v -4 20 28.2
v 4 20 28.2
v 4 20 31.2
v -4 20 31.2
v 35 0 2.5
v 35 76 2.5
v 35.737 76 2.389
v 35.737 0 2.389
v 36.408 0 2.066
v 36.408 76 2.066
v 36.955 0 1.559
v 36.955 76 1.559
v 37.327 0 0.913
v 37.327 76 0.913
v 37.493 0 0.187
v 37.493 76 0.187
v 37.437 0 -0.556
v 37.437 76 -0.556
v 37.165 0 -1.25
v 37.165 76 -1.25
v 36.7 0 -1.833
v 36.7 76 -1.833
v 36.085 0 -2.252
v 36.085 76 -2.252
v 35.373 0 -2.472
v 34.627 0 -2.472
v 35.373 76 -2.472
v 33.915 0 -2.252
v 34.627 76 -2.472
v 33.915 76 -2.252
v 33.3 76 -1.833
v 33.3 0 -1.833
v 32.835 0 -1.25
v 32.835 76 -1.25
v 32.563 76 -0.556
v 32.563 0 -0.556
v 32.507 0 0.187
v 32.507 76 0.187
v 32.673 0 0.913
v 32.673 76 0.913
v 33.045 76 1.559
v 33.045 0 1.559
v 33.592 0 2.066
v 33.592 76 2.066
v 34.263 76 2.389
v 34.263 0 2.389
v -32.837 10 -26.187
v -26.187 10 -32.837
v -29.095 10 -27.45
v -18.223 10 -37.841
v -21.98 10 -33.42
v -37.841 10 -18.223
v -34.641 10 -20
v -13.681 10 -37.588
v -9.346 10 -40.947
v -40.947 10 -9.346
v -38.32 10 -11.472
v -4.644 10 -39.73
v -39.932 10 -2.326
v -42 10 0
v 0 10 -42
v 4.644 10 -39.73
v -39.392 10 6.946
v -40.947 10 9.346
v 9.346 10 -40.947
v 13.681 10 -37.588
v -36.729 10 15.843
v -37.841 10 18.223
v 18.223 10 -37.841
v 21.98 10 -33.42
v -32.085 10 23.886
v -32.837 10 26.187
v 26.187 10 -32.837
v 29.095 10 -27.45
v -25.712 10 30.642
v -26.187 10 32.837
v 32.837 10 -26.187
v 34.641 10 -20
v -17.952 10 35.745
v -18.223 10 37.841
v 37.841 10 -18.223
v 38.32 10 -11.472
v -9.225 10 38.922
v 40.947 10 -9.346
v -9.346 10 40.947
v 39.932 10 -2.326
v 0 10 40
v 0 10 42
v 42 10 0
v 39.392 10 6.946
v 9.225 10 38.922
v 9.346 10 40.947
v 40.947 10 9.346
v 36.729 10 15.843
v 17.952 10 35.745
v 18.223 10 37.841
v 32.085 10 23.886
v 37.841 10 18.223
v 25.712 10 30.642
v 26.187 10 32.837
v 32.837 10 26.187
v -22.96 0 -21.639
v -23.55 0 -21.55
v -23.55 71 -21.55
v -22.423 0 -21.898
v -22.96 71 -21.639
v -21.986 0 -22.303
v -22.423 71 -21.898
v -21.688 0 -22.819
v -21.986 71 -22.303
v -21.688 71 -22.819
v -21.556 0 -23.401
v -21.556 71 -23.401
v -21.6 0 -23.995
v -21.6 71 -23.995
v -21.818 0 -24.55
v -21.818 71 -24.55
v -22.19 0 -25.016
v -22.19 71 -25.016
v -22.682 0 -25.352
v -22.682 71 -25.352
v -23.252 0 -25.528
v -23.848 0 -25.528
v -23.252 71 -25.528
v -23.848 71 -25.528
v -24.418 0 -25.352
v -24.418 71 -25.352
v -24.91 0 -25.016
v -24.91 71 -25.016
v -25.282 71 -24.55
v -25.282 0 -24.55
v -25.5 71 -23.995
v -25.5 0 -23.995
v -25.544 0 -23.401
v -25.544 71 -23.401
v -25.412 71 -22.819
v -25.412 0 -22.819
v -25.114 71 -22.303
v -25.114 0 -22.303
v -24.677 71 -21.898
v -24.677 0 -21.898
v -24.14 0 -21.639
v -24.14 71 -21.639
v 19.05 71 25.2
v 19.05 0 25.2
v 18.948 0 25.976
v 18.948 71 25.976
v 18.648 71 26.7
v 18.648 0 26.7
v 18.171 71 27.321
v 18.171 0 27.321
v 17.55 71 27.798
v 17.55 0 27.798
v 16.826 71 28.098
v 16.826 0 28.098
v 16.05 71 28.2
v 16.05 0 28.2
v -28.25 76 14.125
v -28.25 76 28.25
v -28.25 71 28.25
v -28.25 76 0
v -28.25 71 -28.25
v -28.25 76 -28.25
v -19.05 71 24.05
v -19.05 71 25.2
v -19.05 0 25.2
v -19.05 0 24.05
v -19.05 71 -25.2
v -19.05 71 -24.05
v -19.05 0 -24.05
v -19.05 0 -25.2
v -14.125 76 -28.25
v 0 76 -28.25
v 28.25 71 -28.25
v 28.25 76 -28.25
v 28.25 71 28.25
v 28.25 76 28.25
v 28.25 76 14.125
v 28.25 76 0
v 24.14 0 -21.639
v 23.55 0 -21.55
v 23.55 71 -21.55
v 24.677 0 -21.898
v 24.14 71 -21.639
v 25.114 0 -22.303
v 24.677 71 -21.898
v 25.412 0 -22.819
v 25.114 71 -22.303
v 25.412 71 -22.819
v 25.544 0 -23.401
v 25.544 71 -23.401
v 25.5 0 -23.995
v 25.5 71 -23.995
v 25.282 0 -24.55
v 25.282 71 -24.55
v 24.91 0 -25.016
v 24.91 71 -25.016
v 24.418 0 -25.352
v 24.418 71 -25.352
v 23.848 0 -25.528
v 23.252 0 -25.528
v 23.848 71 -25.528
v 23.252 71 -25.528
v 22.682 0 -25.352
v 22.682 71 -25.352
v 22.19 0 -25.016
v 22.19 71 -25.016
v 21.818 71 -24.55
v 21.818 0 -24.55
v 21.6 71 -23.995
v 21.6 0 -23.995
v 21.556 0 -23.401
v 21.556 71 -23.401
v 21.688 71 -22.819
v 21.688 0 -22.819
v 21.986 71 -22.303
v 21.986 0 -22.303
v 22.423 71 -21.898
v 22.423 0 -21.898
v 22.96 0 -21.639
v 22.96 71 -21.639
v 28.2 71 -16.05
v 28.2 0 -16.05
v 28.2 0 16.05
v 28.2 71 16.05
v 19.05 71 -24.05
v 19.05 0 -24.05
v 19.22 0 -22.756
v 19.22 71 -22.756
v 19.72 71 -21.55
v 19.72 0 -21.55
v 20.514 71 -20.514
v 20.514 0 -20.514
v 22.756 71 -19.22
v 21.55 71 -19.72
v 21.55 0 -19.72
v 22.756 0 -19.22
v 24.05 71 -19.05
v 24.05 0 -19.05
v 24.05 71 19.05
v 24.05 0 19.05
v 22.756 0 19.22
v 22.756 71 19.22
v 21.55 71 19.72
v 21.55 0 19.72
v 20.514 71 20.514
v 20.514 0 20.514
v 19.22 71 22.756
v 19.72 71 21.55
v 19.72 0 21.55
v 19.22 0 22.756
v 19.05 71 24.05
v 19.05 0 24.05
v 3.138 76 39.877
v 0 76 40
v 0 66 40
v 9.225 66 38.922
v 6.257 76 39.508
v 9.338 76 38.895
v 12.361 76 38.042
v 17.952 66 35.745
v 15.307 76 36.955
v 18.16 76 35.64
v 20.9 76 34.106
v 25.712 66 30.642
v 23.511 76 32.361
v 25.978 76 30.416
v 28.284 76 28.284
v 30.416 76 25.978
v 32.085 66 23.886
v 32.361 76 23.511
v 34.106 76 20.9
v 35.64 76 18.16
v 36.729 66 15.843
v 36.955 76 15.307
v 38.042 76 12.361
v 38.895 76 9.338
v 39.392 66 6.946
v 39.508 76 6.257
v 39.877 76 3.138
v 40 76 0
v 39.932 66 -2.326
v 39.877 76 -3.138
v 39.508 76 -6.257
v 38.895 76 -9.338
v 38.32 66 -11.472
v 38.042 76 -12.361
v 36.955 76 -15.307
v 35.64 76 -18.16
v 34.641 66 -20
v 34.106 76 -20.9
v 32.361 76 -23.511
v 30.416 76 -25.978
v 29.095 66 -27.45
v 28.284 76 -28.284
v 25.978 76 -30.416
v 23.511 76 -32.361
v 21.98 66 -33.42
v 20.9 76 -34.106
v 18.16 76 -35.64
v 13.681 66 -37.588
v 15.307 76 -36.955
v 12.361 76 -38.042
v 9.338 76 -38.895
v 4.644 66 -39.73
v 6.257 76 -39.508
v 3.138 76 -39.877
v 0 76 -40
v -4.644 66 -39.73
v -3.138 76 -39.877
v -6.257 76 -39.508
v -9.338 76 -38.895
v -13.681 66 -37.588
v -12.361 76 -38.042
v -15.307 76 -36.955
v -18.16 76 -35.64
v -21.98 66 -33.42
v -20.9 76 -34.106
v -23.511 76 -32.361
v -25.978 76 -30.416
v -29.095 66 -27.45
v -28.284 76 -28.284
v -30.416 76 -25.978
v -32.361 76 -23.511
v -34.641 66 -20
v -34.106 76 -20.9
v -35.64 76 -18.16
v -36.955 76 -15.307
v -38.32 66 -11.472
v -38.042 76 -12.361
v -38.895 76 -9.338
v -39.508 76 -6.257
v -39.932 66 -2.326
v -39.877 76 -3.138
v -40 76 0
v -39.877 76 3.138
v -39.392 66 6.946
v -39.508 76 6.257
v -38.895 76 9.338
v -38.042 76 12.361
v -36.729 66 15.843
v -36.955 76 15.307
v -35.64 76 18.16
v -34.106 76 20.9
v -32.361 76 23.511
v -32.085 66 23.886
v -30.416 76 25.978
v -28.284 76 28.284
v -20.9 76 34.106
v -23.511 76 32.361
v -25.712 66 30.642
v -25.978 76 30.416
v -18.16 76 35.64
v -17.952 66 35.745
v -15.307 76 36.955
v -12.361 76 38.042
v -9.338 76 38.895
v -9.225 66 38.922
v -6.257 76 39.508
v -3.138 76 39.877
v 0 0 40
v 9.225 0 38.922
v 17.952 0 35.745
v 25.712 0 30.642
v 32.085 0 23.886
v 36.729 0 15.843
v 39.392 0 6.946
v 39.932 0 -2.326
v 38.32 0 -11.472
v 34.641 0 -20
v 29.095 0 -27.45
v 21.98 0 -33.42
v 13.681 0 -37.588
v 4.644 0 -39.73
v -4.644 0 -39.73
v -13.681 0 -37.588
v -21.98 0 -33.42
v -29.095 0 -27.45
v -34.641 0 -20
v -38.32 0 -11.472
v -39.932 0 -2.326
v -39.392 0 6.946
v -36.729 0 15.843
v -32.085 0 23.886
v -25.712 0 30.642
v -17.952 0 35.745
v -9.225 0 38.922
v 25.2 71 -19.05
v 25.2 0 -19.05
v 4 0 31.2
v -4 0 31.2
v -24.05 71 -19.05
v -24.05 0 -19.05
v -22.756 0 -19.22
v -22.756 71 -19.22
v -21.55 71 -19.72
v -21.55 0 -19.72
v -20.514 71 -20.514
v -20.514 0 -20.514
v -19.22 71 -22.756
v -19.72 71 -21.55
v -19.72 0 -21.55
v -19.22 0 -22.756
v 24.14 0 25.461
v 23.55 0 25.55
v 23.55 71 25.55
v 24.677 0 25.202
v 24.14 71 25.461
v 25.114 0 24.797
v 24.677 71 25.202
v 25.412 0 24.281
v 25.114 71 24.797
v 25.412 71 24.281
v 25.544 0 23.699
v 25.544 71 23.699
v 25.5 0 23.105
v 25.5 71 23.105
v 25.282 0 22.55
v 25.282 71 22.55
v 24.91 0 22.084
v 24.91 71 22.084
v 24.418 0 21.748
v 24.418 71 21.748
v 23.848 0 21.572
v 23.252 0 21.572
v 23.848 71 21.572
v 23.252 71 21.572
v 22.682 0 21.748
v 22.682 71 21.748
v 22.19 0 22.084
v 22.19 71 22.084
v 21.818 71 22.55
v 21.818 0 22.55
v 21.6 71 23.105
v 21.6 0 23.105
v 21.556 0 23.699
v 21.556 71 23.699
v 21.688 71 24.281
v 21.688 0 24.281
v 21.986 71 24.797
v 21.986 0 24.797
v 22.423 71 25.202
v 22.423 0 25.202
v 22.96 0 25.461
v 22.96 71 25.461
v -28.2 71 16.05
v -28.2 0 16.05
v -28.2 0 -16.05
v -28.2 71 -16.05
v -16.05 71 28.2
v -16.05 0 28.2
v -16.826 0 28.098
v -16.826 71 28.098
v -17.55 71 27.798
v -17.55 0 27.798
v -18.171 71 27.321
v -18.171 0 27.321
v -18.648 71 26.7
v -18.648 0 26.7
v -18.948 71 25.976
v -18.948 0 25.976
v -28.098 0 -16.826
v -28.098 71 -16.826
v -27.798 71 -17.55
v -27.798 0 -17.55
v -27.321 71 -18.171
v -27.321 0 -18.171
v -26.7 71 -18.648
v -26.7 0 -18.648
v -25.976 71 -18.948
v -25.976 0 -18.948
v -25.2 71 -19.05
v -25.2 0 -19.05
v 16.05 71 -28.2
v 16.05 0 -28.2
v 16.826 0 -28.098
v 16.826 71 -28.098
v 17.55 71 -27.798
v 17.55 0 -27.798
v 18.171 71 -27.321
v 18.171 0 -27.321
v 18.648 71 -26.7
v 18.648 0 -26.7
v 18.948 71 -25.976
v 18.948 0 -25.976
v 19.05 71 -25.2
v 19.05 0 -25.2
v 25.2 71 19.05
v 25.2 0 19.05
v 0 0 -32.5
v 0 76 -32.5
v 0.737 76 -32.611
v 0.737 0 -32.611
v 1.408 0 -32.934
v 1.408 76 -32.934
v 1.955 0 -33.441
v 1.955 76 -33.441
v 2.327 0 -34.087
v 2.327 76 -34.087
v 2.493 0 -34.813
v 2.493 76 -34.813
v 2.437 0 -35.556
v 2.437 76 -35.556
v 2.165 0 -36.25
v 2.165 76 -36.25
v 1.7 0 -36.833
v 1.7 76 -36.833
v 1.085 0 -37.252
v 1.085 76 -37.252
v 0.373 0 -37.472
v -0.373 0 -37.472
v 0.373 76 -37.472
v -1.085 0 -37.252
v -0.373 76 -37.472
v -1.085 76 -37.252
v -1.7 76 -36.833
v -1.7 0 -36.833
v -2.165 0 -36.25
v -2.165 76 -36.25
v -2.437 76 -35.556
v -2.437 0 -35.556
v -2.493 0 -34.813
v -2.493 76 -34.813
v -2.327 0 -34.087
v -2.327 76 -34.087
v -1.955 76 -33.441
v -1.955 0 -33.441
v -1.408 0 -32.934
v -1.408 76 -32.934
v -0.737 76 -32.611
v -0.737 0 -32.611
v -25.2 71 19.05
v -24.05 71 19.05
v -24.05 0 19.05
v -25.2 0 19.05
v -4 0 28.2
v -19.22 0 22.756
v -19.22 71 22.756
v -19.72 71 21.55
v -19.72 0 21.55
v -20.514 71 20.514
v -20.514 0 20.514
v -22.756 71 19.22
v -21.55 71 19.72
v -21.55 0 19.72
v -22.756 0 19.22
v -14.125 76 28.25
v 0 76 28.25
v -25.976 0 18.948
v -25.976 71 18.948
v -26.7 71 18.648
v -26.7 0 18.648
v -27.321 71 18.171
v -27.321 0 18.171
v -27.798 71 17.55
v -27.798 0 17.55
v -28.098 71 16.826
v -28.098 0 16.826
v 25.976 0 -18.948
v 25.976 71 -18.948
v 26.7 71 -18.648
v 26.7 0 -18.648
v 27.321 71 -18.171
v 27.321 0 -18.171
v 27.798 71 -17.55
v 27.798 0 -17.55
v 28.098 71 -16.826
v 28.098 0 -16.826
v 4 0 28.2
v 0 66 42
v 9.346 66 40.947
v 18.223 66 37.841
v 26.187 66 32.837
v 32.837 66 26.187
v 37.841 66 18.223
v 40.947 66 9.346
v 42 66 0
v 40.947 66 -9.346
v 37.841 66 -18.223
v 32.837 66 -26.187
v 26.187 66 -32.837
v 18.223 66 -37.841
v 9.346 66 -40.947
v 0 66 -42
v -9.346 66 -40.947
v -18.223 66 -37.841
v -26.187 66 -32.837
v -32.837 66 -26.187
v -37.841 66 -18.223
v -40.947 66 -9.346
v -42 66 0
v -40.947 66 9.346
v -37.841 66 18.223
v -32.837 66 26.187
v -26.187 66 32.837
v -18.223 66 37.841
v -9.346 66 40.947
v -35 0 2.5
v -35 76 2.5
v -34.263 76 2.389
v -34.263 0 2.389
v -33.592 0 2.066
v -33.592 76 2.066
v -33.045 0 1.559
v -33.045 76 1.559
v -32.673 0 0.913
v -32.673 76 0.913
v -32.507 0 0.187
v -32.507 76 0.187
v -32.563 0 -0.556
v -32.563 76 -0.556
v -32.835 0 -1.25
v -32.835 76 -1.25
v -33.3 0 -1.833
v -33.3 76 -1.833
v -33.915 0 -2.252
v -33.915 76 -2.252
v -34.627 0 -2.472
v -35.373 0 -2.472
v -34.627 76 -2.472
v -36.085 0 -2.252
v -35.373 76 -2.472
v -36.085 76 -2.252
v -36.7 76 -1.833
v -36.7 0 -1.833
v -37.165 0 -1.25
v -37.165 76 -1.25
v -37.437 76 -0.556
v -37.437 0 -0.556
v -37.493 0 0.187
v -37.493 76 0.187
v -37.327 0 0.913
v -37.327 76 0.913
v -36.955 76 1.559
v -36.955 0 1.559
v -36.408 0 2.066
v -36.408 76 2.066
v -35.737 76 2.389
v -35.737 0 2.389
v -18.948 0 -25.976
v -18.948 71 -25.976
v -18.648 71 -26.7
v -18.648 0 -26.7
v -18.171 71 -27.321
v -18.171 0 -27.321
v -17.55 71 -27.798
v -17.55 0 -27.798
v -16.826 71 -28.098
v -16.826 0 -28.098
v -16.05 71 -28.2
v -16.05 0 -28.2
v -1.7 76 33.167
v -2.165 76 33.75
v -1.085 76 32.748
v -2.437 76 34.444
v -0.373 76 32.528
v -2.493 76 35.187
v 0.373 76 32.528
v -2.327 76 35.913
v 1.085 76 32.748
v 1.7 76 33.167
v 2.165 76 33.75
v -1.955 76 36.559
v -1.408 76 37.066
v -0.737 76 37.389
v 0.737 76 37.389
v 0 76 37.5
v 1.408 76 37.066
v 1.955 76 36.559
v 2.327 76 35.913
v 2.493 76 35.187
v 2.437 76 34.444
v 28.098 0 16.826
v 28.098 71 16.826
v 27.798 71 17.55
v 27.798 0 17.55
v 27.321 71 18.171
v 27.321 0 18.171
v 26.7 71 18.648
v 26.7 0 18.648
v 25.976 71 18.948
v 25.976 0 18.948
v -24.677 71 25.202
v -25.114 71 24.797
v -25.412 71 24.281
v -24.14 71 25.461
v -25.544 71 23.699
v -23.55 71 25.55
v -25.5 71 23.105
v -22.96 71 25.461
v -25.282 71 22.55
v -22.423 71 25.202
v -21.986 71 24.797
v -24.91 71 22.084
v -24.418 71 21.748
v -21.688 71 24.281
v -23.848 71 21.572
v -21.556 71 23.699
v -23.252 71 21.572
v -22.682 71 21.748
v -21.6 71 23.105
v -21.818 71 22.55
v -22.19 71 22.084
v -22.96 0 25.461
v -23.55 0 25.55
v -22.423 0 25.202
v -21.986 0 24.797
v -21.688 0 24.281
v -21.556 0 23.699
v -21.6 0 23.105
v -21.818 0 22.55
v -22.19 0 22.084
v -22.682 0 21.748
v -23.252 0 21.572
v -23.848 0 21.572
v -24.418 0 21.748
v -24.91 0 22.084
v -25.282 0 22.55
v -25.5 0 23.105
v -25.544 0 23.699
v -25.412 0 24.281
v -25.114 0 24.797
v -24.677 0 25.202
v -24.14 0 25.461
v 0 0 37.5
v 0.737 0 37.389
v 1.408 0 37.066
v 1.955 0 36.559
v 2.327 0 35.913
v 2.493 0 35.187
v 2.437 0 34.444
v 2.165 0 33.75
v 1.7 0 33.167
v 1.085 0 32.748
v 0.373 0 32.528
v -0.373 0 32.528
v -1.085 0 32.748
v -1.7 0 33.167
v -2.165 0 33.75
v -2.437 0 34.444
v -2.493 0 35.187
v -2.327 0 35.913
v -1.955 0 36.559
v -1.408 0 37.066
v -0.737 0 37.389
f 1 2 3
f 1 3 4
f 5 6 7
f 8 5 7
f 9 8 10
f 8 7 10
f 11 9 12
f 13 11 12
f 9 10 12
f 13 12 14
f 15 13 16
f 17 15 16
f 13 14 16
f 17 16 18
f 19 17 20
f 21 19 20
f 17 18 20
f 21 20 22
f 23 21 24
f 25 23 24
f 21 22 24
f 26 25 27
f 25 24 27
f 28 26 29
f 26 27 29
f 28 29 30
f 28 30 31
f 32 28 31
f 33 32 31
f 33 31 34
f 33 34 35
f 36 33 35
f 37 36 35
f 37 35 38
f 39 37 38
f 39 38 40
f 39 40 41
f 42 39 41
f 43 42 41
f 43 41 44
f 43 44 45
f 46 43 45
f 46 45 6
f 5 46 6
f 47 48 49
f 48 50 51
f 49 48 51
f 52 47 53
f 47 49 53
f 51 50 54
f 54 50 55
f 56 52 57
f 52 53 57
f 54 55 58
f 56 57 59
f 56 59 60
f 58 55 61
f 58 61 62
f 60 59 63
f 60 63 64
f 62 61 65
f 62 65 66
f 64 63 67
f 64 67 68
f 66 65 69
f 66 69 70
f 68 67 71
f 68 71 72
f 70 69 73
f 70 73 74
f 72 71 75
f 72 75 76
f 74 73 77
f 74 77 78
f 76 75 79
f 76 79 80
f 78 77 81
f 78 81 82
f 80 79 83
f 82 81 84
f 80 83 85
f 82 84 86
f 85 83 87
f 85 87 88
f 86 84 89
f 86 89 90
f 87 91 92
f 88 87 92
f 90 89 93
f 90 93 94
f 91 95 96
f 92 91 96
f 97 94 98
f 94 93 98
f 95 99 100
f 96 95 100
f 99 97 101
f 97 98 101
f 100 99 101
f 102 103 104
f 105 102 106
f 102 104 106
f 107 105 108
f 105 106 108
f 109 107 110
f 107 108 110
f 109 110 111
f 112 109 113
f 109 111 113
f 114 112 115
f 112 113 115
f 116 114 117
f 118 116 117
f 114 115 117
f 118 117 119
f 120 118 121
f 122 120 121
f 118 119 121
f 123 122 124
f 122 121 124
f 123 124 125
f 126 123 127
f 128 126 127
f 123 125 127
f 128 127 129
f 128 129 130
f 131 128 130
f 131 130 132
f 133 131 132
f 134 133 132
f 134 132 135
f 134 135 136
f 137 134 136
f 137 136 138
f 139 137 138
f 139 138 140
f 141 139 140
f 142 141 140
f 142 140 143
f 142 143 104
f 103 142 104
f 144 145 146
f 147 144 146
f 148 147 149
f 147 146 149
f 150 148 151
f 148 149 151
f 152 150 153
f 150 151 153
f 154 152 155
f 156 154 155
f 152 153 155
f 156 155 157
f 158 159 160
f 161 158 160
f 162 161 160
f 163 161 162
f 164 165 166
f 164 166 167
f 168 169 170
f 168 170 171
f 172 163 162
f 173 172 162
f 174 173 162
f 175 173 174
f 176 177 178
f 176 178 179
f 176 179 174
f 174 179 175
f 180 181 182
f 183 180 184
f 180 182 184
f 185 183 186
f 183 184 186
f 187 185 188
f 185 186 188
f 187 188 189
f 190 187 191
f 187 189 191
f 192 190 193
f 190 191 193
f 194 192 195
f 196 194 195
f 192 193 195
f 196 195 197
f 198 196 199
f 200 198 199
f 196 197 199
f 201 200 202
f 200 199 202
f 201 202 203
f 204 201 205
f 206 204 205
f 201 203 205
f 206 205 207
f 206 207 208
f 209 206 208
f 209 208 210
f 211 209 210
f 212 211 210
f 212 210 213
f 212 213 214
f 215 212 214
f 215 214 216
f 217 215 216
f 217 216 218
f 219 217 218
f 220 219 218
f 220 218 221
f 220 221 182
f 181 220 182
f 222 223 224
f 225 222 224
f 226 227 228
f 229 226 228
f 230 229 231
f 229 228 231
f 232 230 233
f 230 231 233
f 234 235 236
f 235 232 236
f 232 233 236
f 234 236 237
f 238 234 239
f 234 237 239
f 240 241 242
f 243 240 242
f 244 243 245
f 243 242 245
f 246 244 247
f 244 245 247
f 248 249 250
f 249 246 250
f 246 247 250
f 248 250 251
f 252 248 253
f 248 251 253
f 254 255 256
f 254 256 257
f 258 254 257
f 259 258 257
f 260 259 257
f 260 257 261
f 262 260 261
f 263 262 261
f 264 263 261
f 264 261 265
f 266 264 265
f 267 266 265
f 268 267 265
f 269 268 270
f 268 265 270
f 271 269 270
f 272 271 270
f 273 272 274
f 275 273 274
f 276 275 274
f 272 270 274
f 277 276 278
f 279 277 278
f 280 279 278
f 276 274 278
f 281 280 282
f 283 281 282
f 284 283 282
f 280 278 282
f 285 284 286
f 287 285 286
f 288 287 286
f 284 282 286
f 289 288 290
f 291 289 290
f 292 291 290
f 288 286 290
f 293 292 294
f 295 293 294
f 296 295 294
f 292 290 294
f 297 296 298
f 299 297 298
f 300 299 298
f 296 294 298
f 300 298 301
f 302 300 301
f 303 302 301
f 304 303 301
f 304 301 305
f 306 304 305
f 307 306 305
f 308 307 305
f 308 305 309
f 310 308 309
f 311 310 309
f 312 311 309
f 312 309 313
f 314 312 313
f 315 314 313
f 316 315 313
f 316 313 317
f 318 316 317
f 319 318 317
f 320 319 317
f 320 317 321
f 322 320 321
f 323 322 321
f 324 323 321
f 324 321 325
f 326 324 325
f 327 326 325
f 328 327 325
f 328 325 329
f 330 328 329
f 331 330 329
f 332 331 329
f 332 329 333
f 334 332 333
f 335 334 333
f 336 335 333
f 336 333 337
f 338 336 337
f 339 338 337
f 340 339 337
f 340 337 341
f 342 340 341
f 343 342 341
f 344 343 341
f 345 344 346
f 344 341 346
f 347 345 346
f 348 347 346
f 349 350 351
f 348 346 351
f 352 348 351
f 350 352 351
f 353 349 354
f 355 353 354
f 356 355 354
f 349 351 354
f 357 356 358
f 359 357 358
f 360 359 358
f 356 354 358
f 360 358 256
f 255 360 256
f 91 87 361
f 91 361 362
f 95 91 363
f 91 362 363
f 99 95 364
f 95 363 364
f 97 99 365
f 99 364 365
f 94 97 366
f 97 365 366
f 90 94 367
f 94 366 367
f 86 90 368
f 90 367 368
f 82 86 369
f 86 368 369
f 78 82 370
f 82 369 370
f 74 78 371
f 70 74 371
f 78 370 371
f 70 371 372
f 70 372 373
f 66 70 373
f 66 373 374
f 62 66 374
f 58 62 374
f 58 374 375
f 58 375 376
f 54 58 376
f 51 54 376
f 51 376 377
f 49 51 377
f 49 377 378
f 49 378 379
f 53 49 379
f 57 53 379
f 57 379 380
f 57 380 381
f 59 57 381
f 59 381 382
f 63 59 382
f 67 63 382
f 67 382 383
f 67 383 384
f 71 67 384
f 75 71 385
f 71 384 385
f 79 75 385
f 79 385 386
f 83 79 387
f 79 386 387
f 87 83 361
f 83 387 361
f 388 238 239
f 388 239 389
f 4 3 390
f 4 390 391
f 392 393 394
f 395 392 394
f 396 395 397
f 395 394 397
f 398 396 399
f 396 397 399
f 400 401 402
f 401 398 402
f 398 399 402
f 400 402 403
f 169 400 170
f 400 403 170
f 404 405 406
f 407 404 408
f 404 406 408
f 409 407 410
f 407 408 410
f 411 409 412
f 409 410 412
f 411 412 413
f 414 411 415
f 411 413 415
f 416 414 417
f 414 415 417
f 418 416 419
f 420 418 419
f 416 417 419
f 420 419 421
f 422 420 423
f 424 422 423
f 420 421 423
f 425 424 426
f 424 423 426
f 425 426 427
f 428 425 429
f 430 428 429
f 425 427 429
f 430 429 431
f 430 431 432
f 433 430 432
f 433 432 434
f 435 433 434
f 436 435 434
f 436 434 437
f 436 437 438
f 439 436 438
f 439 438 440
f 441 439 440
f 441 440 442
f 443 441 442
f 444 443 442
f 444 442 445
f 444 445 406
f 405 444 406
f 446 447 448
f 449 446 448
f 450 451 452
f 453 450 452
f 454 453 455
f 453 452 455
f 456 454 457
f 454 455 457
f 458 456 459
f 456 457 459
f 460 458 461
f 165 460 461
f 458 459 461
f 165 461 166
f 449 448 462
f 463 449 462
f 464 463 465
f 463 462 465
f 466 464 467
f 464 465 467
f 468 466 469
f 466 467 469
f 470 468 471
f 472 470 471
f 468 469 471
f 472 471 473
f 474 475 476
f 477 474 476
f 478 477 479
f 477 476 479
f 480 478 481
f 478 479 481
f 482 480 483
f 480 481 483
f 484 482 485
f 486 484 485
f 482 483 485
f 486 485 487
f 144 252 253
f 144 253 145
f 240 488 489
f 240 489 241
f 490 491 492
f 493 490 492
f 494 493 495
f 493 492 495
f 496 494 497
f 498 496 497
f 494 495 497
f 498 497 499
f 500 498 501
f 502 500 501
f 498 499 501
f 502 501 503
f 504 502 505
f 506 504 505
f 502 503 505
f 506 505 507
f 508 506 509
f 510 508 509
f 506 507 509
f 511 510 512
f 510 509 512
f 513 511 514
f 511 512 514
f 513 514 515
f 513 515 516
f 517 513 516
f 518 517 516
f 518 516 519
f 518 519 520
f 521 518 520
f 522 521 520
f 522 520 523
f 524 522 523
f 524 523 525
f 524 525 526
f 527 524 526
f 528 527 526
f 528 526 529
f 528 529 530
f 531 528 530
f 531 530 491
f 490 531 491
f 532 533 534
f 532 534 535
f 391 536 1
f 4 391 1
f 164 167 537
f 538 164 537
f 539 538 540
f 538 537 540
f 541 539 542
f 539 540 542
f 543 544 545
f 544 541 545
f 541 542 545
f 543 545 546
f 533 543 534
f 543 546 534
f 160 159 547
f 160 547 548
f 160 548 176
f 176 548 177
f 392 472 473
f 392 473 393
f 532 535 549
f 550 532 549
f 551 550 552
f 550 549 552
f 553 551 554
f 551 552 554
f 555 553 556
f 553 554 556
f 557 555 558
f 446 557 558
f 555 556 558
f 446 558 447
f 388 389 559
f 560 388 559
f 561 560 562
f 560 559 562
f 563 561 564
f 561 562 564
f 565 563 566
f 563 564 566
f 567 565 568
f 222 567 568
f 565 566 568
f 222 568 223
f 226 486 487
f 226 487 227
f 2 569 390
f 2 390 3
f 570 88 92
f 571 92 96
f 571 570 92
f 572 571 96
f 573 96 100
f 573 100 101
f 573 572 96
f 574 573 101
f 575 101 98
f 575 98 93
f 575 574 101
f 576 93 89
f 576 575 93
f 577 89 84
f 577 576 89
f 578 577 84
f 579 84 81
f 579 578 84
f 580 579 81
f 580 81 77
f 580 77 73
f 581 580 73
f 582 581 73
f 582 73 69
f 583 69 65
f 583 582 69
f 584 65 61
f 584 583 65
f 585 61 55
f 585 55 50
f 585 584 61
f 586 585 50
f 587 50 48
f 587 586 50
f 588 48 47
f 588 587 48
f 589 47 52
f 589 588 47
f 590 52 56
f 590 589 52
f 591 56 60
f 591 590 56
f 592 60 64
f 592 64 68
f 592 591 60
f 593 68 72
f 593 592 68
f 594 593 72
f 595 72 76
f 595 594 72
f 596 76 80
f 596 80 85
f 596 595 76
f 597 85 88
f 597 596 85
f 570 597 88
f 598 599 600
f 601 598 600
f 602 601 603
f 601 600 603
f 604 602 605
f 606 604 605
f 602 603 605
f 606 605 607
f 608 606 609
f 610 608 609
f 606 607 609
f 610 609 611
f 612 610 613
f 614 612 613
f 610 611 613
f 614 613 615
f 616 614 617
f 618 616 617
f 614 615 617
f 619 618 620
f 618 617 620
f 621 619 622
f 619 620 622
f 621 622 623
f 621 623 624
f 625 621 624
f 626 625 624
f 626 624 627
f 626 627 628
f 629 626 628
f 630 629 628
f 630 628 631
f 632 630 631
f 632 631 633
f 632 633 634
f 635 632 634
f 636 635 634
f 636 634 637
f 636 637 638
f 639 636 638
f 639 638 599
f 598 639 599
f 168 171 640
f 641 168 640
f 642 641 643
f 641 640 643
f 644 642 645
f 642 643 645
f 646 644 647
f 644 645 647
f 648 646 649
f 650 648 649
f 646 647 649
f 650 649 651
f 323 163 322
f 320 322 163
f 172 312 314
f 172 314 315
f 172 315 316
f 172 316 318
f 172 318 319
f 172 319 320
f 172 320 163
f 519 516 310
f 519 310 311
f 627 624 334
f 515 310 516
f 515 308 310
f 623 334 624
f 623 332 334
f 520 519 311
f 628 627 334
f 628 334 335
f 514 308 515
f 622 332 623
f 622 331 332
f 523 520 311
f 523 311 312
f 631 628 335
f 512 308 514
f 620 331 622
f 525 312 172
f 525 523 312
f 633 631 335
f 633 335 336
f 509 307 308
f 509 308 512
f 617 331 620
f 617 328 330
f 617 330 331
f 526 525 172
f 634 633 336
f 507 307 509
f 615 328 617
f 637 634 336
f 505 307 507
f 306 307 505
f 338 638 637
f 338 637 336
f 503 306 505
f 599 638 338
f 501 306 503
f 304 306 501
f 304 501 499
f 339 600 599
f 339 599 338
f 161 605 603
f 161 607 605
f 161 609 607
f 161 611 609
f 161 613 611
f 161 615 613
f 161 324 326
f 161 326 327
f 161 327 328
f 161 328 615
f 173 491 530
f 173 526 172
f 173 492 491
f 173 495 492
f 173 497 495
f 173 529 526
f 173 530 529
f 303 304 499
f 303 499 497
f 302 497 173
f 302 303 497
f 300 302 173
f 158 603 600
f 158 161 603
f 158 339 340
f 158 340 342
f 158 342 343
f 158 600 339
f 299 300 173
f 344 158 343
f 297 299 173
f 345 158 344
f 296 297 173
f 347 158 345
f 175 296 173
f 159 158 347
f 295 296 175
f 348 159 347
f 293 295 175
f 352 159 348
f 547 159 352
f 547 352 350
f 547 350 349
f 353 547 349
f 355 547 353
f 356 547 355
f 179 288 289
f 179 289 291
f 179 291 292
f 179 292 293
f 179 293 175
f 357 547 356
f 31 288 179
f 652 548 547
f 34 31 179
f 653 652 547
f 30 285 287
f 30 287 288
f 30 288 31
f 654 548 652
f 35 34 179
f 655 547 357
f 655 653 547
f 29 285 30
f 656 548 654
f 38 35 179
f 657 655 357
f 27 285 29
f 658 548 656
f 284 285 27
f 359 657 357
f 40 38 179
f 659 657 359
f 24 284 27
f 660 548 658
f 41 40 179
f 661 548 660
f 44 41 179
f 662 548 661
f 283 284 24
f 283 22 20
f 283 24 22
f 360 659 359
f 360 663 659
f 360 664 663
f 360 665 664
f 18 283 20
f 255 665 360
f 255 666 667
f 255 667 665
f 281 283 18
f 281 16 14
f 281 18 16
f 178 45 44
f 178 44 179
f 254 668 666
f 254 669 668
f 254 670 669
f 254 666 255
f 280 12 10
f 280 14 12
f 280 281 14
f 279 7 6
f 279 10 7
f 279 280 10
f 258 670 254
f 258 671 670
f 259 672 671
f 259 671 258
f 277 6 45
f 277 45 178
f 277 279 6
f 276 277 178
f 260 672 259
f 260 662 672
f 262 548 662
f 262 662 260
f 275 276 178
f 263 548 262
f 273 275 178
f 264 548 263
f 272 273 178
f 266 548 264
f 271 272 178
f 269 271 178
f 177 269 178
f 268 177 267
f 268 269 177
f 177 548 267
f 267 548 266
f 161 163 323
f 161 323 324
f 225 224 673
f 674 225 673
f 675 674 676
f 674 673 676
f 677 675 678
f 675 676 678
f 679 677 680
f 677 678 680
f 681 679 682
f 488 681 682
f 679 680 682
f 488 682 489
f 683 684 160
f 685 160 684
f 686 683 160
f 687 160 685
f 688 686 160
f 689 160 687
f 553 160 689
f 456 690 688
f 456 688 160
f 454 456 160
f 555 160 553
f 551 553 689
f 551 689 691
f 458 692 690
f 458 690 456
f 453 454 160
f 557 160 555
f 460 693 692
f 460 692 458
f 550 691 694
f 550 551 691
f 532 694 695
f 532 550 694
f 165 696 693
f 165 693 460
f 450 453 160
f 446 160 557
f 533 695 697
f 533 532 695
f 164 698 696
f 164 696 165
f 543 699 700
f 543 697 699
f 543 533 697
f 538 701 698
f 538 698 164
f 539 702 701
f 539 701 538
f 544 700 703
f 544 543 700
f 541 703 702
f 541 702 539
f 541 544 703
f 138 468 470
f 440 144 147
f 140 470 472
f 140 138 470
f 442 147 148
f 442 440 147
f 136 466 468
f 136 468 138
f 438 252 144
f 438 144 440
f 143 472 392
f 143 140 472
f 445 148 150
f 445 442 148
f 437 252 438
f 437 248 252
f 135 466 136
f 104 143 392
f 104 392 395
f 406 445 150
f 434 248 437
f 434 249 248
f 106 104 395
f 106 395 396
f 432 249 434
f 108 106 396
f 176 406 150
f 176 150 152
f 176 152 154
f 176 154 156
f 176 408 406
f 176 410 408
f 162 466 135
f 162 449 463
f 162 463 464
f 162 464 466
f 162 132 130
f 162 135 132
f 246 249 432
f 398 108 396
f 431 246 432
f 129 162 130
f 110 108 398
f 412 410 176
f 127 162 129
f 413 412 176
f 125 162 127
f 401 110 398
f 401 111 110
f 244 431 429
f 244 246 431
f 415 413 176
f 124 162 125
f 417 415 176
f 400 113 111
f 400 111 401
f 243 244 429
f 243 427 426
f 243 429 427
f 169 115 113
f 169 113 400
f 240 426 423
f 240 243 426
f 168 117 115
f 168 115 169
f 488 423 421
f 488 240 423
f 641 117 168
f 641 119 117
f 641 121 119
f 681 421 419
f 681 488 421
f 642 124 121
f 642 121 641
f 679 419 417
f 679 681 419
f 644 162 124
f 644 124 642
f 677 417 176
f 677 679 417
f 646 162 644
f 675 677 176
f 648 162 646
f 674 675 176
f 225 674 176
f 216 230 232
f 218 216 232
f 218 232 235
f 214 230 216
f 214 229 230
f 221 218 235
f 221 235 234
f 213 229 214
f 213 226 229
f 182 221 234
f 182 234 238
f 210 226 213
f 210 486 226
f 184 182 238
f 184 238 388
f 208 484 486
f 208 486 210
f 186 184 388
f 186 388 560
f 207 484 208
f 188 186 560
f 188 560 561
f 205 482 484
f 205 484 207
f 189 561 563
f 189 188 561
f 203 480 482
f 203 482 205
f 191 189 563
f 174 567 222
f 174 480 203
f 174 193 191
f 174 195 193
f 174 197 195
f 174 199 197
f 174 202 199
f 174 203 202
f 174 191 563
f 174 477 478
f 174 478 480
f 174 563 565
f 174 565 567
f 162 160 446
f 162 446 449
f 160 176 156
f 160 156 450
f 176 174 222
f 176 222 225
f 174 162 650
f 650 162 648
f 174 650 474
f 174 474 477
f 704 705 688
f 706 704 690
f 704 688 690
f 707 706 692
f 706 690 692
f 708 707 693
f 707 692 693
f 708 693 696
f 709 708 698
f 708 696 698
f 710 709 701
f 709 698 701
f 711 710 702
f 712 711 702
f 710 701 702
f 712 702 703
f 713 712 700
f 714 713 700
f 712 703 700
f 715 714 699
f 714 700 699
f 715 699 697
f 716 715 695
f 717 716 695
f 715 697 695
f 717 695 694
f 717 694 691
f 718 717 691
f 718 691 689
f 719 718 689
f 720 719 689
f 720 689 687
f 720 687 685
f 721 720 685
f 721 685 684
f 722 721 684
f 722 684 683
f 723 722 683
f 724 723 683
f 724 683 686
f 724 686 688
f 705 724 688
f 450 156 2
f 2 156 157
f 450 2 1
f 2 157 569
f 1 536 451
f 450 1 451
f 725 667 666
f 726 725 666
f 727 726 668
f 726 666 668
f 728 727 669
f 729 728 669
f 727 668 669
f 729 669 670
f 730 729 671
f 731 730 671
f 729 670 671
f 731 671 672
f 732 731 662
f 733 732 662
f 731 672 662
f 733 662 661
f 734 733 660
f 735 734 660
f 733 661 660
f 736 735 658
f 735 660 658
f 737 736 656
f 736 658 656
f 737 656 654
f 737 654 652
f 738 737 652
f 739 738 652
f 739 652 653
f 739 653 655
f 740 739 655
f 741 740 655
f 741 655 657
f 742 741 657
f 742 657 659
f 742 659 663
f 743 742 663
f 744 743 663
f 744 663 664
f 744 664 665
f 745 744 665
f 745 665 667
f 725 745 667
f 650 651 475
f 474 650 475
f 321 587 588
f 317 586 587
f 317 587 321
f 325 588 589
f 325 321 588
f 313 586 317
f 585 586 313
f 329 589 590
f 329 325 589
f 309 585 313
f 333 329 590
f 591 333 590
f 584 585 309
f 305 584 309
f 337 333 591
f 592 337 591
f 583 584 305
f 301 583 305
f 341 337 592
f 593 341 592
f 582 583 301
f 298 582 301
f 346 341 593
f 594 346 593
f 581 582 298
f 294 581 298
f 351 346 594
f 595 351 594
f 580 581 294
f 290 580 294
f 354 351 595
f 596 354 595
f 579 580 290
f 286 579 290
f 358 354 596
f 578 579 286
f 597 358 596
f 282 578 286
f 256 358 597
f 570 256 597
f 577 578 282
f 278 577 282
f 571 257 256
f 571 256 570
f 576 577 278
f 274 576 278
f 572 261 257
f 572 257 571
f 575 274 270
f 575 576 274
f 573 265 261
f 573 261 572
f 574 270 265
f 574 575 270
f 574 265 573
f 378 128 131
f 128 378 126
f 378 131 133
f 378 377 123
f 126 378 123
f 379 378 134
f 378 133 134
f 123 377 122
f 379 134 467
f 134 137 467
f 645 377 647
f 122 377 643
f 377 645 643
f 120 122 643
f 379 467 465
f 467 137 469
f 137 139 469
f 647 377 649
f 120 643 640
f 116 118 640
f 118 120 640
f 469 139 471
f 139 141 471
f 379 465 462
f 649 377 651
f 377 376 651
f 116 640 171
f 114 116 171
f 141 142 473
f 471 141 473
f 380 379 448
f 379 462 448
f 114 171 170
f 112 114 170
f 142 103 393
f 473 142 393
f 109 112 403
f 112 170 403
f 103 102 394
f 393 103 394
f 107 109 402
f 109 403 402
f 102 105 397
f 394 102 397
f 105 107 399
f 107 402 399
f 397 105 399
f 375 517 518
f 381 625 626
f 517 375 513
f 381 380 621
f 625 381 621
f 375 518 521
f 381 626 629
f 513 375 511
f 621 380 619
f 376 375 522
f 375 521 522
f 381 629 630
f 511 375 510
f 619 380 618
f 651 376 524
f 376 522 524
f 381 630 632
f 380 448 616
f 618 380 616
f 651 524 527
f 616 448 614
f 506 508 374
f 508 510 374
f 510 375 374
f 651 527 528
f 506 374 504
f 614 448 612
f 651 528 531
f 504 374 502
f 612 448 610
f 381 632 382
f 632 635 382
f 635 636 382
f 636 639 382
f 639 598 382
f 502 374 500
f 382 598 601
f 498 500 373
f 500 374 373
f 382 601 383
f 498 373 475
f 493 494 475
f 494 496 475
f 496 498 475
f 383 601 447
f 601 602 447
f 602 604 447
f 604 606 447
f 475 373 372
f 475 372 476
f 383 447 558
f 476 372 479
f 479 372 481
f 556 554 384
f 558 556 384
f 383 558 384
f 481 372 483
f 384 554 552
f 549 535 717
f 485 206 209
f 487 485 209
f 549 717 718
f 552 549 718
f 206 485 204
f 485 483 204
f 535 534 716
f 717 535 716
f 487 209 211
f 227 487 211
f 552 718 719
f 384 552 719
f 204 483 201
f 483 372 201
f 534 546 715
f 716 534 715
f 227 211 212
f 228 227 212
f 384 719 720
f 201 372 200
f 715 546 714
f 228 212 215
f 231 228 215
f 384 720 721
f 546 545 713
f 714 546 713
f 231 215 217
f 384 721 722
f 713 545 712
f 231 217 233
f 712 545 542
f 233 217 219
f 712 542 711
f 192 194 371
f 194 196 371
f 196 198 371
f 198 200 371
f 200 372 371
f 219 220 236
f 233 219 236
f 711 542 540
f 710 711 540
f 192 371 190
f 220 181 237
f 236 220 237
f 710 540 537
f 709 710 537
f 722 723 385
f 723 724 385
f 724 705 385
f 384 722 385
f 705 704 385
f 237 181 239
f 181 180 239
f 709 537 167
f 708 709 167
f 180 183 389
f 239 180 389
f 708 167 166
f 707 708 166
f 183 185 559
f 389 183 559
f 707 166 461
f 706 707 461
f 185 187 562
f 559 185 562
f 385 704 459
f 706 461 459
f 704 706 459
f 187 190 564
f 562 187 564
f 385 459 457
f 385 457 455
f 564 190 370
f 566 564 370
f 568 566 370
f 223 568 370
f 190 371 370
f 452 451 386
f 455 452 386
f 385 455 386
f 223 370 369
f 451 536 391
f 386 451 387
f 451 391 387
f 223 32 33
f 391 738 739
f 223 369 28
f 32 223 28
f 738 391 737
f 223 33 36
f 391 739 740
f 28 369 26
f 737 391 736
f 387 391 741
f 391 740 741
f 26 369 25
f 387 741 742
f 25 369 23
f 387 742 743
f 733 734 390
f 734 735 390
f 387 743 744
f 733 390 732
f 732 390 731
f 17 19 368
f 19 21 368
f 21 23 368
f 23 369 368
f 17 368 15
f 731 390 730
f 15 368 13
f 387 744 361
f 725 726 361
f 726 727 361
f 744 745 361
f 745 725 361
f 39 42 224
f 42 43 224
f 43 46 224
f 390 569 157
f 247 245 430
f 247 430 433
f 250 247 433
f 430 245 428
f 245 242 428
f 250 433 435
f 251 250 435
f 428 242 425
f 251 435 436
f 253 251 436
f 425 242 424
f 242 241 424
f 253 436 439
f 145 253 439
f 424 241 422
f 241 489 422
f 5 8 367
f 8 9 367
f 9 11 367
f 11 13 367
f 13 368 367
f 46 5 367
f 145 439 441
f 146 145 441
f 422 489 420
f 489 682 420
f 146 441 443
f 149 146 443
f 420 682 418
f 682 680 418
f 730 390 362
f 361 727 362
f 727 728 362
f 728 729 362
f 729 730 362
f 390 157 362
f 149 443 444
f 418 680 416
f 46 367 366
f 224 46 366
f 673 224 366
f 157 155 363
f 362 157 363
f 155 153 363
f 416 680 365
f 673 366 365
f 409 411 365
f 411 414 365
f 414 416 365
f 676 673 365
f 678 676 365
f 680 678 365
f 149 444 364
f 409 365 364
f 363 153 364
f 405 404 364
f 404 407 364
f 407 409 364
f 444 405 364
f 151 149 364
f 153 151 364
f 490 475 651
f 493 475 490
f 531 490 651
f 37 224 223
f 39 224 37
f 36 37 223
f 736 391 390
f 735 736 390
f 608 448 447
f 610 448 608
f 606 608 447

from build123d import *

# Parameters (mm, degrees)
SKETCH2_R           = 40
BOSS_EXTRUDE1_DEPTH = 76
SKETCH3_W           = 8
SKETCH3_H           = 20
CUT_EXTRUDE1_DEPTH  = 3
SKETCH4_R           = 42
SKETCH4_R_2         = 40
BOSS_EXTRUDE3_DEPTH = 28
SKETCH5_W           = 56.5
SKETCH5_H           = 56.5
CUT_EXTRUDE7_DEPTH  = 5
SKETCH6_R           = 2
CUT_EXTRUDE8_DEPTH  = 93.568893263
SKETCH7_R           = 2.5
CUT_EXTRUDE9_DEPTH  = 97.457244414


with BuildPart() as part:
    # Sketch2 → Boss-Extrude1 (new body)
    with BuildSketch(Plane(origin=(0, 0, 0), x_dir=(1, 0, 0), z_dir=(0, 1, 0))):
        with Locations(Location((0, 0, 0), (0, 0, 270))):
            Circle(SKETCH2_R)
        with BuildLine():
            Line((-16.05, 28.2), (16.05, 28.2))
            ThreePointArc((16.05, 28.2), (18.171320344, 27.321320344), (19.05, 25.2))
            Line((19.05, 25.2), (19.05, 24.05))
            ThreePointArc((19.05, 24.05), (20.514466094, 20.514466094), (24.05, 19.05))
            Line((24.05, 19.05), (25.2, 19.05))
            ThreePointArc((25.2, 19.05), (27.321320344, 18.171320344), (28.2, 16.05))
            Line((28.2, 16.05), (28.2, -16.05))
            ThreePointArc((28.2, -16.05), (27.321320344, -18.171320344), (25.2, -19.05))
            Line((25.2, -19.05), (24.05, -19.05))
            ThreePointArc((24.05, -19.05), (20.514466094, -20.514466094), (19.05, -24.05))
            Line((19.05, -24.05), (19.05, -25.2))
            ThreePointArc((19.05, -25.2), (18.171320344, -27.321320344), (16.05, -28.2))
            Line((16.05, -28.2), (-16.05, -28.2))
            ThreePointArc((-16.05, -28.2), (-18.171320344, -27.321320344), (-19.05, -25.2))
            Line((-19.05, -25.2), (-19.05, -24.05))
            ThreePointArc((-19.05, -24.05), (-20.514466094, -20.514466094), (-24.05, -19.05))
            Line((-24.05, -19.05), (-25.2, -19.05))
            ThreePointArc((-25.2, -19.05), (-27.321320344, -18.171320344), (-28.2, -16.05))
            Line((-28.2, -16.05), (-28.2, 16.05))
            ThreePointArc((-28.2, 16.05), (-27.321320344, 18.171320344), (-25.2, 19.05))
            Line((-25.2, 19.05), (-24.05, 19.05))
            ThreePointArc((-24.05, 19.05), (-20.514466094, 20.514466094), (-19.05, 24.05))
            Line((-19.05, 24.05), (-19.05, 25.2))
            ThreePointArc((-19.05, 25.2), (-18.171320344, 27.321320344), (-16.05, 28.2))
        make_face(mode=Mode.SUBTRACT)
    extrude(amount=BOSS_EXTRUDE1_DEPTH)

    # Sketch3 → Cut-Extrude1 (cut)
    with BuildSketch(Plane(origin=(0, 0, 28.2), x_dir=(-1, 0, 0), z_dir=(0, 0, -1))):
        with Locations((0, 10)):
            Rectangle(SKETCH3_W, SKETCH3_H)
    extrude(amount=-CUT_EXTRUDE1_DEPTH, mode=Mode.SUBTRACT)

    # Sketch4 → Boss-Extrude3 (add, symmetric)
    with BuildSketch(Plane(origin=(0, 38, 0), x_dir=(1, 0, 0), z_dir=(0, 1, 0))):
        with Locations(Location((0, 0, 0), (0, 0, 270))):
            Circle(SKETCH4_R)
        with Locations(Location((0, 0, 0), (0, 0, 270))):
            Circle(SKETCH4_R_2, mode=Mode.SUBTRACT)
    extrude(amount=BOSS_EXTRUDE3_DEPTH, both=True)

    # Sketch5 → Cut-Extrude7 (cut)
    with BuildSketch(Plane(origin=(0, 76, 0), x_dir=(1, 0, 0), z_dir=(0, 1, 0))):
        Rectangle(SKETCH5_W, SKETCH5_H)
    extrude(amount=-CUT_EXTRUDE7_DEPTH, mode=Mode.SUBTRACT)

    # Sketch6 → Cut-Extrude8 (cut, through all)
    with BuildSketch(Plane(origin=(0, 71, 0), x_dir=(1, 0, 0), z_dir=(0, 1, 0))):
        with Locations(Location((-23.55, 23.55, 0), (0, 0, 270))):
            Circle(SKETCH6_R)
        with Locations(Location((23.55, 23.55, 0), (0, 0, 270))):
            Circle(SKETCH6_R)
        with Locations(Location((23.55, -23.55, 0), (0, 0, 270))):
            Circle(SKETCH6_R)
        with Locations(Location((-23.55, -23.55, 0), (0, 0, 270))):
            Circle(SKETCH6_R)
    extrude(amount=-CUT_EXTRUDE8_DEPTH, mode=Mode.SUBTRACT)

    # Sketch7 → Cut-Extrude9 (cut, through all)
    with BuildSketch(Plane(origin=(0, 76, 0), x_dir=(1, 0, 0), z_dir=(0, 1, 0))):
        with Locations(Location((0, 35, 0), (0, 0, 270))):
            Circle(SKETCH7_R)
        with Locations(Location((35, 0, 0), (0, 0, 270))):
            Circle(SKETCH7_R)
        with Locations(Location((0, -35, 0), (0, 0, 270))):
            Circle(SKETCH7_R)
        with Locations(Location((-35, 0, 0), (0, 0, 270))):
            Circle(SKETCH7_R)
    extrude(amount=-CUT_EXTRUDE9_DEPTH, mode=Mode.SUBTRACT)


solid = part.part
